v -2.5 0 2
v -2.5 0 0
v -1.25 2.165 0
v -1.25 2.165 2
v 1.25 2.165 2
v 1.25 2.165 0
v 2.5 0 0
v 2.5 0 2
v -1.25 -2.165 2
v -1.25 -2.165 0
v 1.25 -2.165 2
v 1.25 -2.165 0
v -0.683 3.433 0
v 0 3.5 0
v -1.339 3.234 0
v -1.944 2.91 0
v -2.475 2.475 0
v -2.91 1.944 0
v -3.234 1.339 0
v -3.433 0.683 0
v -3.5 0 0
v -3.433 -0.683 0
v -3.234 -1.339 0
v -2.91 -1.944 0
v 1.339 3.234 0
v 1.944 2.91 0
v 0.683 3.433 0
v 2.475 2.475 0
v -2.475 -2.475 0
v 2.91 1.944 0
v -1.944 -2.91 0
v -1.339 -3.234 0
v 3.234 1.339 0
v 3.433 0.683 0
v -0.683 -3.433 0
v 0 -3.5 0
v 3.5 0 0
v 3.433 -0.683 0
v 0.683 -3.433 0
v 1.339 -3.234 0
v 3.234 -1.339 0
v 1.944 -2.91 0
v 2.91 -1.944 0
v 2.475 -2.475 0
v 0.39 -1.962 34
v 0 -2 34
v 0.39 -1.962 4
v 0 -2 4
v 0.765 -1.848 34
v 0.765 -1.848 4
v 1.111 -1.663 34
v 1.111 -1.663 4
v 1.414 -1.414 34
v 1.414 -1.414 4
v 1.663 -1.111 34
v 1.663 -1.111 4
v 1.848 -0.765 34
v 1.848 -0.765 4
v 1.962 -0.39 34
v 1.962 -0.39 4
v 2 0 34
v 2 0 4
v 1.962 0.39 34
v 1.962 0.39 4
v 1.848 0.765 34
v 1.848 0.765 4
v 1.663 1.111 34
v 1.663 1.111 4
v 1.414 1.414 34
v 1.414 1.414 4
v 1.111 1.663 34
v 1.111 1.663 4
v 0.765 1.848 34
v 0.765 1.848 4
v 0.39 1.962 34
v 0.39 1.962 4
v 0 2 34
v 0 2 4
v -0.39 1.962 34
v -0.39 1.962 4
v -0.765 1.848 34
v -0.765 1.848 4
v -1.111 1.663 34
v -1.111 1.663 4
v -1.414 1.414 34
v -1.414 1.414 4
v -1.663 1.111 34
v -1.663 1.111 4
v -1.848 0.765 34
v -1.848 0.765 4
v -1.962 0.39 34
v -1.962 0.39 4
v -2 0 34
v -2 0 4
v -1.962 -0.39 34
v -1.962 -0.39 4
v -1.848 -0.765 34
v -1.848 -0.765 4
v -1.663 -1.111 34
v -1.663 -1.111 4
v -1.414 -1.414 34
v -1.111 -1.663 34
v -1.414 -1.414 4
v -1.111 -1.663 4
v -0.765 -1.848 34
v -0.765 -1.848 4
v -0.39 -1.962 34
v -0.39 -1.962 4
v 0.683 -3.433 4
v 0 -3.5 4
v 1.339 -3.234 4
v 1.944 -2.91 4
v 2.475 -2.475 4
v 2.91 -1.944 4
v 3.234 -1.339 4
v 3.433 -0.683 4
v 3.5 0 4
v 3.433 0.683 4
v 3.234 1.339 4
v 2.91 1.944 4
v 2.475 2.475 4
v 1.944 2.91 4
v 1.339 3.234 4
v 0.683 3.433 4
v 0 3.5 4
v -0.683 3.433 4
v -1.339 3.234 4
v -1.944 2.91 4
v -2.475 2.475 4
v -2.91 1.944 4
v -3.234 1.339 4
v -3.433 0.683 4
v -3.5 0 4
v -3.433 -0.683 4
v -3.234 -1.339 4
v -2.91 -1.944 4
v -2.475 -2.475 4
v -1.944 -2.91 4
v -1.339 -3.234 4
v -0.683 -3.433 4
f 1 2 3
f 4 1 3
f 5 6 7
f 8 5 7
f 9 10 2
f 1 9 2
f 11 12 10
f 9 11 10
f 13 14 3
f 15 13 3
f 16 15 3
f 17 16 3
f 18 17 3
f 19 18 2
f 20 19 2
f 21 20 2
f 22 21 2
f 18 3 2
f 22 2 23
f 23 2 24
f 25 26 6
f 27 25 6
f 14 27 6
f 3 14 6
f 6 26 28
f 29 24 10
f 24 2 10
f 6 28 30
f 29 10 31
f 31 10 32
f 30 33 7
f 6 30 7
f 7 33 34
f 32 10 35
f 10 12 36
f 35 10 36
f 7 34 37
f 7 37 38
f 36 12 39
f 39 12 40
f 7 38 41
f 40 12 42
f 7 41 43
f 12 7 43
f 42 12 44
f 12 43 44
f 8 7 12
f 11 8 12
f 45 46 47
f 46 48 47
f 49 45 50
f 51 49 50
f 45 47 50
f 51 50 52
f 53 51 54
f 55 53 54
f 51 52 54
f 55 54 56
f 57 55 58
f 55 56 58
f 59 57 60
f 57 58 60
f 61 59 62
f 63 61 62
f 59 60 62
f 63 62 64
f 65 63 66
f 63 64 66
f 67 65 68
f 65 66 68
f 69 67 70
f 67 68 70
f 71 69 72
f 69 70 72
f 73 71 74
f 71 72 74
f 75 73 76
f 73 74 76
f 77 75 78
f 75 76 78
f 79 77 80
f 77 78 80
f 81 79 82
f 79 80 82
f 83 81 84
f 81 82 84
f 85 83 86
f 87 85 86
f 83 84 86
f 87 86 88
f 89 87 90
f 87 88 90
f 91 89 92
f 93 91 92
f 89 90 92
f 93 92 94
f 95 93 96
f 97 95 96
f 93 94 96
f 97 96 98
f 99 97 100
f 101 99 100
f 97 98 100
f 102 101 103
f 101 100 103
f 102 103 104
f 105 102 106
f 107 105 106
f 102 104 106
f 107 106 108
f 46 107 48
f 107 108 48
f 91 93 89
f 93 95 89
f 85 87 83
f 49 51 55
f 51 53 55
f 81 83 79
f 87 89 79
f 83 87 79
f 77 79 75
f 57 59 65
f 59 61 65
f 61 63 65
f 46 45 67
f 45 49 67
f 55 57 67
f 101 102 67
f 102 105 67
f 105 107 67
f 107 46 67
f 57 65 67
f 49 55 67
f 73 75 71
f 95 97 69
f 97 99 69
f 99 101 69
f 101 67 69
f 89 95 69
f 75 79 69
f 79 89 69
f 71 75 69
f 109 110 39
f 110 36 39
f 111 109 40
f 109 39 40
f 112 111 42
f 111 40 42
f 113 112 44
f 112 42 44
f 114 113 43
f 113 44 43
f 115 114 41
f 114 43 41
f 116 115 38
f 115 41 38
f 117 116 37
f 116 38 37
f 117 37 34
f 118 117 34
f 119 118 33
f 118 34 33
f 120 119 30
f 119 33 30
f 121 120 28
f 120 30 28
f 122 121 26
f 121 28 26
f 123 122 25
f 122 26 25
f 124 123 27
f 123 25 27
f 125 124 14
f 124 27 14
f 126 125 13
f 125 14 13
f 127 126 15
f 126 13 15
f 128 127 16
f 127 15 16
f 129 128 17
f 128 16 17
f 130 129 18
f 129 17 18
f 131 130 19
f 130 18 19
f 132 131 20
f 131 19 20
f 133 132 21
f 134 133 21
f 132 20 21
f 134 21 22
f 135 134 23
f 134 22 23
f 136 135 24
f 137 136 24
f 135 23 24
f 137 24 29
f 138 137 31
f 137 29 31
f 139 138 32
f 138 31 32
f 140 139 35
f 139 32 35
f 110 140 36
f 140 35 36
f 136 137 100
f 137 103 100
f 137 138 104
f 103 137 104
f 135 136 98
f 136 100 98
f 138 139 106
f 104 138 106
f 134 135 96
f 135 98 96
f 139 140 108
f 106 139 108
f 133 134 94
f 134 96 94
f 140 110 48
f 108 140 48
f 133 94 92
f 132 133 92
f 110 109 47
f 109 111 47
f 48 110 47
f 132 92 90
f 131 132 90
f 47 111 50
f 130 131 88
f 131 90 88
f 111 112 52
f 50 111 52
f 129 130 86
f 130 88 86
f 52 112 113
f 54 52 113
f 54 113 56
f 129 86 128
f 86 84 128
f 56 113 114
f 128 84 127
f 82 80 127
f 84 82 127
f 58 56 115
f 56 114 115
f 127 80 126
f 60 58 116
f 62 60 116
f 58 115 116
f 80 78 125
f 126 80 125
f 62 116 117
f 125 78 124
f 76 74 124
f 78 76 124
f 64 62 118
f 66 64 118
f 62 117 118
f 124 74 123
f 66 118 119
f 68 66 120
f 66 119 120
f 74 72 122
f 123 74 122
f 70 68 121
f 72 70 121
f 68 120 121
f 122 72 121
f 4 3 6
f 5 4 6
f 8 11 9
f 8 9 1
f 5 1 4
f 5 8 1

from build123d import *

# Parameters (mm, degrees)
POCKET_DEPTH = 2


with BuildPart() as part:
    # Sketch → Revolution (revolve)
    with BuildSketch(Plane.YZ):
        Polygon((-3.5, 4), (-3.5, 0), (0, 0), (0, 34), (-2, 34), (-2, 4), align=None)
    revolve(axis=Axis((0, 0, 0), (0, 0, 1)))

    # Sketch001 (on Face2 of Revolution) → Pocket (cut)
    with BuildSketch(Plane.YX):
        Polygon((0, 2.5), (-2.165064, 1.25), (-2.165064, -1.25), (0, -2.5), (2.165064, -1.25), (2.165064, 1.25), align=None)
    extrude(amount=-POCKET_DEPTH, mode=Mode.SUBTRACT)


solid = part.part
